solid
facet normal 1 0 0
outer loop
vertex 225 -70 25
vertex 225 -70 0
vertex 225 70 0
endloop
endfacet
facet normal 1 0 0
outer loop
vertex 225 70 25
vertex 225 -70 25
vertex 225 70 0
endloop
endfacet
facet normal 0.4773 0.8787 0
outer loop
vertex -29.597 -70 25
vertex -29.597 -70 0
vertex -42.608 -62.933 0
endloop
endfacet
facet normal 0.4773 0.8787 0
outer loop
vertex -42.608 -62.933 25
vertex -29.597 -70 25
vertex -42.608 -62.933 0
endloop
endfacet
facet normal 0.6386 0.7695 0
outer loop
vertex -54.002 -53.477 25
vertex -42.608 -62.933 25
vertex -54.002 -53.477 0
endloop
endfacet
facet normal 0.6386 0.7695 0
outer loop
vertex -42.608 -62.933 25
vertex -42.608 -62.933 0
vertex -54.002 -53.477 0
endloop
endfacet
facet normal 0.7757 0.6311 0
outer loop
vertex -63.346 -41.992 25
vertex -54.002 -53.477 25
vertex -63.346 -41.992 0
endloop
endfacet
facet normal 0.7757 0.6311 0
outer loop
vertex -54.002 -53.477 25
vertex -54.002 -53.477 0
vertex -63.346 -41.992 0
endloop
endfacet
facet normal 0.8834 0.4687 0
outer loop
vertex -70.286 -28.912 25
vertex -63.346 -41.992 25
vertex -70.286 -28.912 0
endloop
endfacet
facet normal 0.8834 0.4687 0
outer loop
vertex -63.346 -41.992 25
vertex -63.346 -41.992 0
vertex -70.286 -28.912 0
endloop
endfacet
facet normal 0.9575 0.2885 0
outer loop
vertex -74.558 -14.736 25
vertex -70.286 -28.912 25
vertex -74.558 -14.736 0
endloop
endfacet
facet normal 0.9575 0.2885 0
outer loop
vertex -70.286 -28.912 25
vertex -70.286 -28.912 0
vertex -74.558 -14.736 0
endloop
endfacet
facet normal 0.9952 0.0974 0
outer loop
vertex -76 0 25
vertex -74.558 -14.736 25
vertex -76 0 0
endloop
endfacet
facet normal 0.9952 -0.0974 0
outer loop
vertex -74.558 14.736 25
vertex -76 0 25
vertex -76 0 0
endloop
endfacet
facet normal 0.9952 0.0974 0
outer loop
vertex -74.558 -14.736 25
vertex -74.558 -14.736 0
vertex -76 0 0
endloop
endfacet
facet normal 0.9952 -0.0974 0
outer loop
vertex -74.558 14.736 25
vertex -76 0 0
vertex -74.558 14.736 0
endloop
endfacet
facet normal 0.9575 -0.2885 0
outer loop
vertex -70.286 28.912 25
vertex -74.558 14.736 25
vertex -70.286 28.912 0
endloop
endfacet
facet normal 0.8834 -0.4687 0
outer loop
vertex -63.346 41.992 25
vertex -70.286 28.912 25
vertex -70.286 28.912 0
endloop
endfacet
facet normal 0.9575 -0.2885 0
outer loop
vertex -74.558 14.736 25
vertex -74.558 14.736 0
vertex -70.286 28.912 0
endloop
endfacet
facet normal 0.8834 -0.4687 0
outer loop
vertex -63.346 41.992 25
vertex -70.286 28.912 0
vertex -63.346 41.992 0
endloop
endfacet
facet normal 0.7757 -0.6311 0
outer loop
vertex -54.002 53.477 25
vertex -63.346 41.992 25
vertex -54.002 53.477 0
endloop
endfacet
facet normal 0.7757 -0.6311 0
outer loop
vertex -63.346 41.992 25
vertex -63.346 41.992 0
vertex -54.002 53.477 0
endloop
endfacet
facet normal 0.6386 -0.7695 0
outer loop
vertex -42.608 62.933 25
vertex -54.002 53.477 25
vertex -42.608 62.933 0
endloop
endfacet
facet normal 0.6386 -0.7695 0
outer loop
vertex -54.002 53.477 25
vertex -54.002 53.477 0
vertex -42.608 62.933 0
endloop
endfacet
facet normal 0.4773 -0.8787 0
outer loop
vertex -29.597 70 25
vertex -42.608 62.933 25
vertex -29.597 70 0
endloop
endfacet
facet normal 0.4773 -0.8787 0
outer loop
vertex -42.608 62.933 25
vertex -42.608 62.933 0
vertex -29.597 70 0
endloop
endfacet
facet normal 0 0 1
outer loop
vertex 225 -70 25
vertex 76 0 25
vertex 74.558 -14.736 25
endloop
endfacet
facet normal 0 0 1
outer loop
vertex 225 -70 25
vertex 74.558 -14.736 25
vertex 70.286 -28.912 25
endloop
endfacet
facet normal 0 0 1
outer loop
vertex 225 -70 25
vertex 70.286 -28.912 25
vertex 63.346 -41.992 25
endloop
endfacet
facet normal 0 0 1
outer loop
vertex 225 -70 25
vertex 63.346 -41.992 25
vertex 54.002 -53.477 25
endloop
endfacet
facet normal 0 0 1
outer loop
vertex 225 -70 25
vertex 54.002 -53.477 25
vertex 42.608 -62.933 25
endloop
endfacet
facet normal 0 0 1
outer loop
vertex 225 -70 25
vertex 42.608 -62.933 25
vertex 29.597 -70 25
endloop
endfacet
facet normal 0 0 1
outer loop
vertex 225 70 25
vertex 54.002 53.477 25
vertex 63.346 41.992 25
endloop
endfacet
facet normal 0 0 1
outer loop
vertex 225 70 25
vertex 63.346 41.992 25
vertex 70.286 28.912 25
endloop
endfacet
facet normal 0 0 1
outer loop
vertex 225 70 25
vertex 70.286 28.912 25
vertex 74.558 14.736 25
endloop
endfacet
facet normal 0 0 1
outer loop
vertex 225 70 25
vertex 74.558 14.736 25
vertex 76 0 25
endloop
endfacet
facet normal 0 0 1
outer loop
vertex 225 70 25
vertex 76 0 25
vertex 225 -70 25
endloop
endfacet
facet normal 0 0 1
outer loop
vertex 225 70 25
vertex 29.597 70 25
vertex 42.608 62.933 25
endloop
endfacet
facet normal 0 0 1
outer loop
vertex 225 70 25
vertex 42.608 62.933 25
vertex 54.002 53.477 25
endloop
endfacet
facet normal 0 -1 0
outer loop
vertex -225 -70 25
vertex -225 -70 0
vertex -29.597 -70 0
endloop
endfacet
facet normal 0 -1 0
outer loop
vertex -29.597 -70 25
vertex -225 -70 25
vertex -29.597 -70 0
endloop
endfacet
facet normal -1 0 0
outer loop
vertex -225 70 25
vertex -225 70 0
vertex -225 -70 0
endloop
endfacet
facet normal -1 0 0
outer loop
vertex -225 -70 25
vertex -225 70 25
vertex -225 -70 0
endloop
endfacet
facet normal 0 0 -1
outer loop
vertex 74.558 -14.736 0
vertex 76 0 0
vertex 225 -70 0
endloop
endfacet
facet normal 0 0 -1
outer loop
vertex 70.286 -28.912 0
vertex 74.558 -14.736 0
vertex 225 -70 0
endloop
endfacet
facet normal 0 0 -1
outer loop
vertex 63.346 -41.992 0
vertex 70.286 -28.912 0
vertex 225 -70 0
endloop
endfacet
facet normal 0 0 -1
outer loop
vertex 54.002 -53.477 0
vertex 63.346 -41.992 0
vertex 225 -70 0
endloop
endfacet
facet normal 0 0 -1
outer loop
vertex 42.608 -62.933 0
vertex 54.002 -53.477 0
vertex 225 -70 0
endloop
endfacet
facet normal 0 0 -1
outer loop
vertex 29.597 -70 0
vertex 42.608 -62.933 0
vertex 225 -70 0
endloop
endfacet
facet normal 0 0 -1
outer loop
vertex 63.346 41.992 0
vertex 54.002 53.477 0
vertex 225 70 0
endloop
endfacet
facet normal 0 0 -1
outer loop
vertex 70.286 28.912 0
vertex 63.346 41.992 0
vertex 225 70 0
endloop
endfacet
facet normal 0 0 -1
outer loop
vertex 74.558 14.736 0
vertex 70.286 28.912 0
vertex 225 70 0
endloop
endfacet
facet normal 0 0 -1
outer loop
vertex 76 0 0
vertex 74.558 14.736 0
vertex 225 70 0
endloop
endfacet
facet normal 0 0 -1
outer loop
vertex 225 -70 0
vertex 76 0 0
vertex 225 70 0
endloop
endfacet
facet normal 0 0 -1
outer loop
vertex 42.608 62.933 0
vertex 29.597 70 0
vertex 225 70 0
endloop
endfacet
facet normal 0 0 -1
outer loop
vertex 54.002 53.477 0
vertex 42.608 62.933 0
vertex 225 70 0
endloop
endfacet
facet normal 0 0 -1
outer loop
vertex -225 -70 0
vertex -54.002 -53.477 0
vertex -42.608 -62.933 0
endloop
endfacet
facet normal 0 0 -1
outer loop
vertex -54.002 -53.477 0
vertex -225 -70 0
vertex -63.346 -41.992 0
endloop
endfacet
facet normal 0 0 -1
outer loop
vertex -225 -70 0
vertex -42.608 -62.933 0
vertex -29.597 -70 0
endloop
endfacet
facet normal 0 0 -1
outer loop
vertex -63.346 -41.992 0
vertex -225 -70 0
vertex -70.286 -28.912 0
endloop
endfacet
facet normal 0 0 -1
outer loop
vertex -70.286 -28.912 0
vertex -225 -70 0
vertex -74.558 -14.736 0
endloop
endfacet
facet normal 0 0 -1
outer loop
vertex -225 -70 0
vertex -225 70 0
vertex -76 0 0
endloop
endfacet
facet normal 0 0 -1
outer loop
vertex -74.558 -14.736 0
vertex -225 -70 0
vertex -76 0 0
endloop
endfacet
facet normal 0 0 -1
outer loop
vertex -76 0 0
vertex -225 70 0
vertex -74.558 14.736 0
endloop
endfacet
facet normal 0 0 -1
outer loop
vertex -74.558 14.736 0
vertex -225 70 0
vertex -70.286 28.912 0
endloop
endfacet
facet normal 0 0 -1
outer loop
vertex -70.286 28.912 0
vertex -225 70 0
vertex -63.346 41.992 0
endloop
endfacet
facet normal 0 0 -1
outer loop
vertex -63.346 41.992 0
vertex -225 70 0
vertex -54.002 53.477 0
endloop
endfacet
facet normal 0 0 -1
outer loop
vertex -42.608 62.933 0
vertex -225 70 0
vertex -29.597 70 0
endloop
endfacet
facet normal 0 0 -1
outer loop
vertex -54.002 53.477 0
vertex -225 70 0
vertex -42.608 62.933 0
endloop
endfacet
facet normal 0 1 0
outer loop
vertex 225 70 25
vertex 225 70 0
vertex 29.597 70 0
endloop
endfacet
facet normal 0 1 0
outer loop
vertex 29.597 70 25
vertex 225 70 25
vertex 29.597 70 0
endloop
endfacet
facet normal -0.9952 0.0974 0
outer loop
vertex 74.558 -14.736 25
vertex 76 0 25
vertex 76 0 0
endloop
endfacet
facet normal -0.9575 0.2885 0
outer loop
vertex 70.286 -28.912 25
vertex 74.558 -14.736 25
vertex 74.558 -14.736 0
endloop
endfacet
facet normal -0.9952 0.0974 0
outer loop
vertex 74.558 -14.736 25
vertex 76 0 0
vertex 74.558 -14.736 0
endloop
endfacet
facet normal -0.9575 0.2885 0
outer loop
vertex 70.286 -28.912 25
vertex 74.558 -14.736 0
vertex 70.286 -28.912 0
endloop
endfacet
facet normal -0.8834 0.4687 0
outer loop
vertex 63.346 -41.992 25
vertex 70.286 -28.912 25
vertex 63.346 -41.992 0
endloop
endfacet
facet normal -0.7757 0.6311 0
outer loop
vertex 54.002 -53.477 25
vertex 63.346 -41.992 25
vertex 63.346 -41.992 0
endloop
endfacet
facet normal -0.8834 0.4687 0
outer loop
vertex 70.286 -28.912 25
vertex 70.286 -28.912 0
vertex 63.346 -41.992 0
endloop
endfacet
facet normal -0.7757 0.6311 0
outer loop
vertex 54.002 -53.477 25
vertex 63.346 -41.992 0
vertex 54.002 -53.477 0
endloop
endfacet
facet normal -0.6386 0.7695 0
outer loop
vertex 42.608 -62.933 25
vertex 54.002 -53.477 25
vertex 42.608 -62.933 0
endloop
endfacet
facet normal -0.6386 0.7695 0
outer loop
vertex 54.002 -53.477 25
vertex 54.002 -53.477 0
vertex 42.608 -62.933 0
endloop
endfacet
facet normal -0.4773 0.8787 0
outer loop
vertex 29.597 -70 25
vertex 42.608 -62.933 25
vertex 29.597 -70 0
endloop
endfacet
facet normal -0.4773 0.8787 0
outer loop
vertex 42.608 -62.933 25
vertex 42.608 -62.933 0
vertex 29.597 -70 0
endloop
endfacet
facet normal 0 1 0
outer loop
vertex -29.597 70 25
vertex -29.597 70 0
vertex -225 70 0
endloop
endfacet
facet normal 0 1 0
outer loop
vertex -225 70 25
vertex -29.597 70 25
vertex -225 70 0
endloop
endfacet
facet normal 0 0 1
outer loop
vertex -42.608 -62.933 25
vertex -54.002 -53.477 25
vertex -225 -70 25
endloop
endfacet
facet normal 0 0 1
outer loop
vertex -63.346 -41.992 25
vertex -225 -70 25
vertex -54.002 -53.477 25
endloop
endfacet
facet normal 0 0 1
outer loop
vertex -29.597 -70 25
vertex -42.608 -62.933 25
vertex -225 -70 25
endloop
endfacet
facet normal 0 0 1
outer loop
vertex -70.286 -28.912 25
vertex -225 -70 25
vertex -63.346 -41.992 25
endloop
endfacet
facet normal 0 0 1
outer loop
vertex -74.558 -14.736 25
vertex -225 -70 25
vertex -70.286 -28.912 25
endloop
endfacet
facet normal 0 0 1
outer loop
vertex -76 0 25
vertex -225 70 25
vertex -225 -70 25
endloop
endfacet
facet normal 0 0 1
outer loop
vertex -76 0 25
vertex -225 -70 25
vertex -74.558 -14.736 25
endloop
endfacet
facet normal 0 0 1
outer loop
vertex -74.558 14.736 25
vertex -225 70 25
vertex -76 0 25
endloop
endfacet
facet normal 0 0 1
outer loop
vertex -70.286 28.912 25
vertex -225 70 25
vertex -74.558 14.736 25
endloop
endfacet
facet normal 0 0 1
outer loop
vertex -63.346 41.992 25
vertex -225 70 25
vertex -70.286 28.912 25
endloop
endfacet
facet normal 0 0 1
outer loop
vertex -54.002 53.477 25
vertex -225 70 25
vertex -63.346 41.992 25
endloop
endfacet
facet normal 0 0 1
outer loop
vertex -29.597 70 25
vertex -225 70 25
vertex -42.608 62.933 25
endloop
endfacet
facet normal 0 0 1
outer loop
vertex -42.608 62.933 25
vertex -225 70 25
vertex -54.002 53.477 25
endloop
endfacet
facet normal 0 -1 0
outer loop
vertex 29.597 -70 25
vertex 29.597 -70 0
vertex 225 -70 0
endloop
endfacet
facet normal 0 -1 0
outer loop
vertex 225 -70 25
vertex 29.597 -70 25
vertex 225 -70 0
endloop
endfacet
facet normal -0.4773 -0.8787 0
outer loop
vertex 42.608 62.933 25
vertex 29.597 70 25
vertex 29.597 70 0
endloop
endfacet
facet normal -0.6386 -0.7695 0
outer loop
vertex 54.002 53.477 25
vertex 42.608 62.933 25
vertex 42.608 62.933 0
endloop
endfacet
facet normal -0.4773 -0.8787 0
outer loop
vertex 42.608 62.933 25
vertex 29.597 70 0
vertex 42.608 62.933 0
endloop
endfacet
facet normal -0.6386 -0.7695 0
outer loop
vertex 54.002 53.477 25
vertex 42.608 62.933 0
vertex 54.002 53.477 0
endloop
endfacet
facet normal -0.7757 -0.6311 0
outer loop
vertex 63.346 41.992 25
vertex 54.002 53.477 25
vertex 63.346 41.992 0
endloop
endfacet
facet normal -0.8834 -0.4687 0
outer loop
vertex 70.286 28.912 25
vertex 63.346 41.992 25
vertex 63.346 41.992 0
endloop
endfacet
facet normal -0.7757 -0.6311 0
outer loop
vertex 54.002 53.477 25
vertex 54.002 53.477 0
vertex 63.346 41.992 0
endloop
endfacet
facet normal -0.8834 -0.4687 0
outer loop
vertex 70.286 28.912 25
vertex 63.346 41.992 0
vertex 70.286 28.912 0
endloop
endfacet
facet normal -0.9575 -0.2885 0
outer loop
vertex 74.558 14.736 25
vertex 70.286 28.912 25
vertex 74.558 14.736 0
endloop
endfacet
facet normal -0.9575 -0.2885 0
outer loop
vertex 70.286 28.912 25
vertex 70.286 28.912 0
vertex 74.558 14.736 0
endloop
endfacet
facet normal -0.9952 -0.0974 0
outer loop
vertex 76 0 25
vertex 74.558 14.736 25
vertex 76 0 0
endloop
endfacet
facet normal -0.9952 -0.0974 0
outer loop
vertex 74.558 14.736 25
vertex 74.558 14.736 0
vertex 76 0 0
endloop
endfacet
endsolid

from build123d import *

# Parameters (mm, degrees)
F1_DEPTH = 25


with BuildPart() as f1:
    # F0 (on Top) → F1 (new body)
    with BuildSketch(Plane.XY):
        with BuildLine():
            ThreePointArc((29.597297, 70), (63.345855, 41.991698), (76, 0))
            ThreePointArc((76, 0), (63.345855, -41.991698), (29.597297, -70))
            Line((29.597297, -70), (225, -70))
            Line((225, -70), (225, 70))
            Line((225, 70), (29.597297, 70))
        make_face()
        with BuildLine():
            ThreePointArc((-29.597297, -70), (-76, 0), (-29.597297, 70))
            Line((-29.597297, 70), (-225, 70))
            Line((-225, 70), (-225, -70))
            Line((-225, -70), (-29.597297, -70))
        make_face()
    extrude(amount=F1_DEPTH)


solid = f1.part
